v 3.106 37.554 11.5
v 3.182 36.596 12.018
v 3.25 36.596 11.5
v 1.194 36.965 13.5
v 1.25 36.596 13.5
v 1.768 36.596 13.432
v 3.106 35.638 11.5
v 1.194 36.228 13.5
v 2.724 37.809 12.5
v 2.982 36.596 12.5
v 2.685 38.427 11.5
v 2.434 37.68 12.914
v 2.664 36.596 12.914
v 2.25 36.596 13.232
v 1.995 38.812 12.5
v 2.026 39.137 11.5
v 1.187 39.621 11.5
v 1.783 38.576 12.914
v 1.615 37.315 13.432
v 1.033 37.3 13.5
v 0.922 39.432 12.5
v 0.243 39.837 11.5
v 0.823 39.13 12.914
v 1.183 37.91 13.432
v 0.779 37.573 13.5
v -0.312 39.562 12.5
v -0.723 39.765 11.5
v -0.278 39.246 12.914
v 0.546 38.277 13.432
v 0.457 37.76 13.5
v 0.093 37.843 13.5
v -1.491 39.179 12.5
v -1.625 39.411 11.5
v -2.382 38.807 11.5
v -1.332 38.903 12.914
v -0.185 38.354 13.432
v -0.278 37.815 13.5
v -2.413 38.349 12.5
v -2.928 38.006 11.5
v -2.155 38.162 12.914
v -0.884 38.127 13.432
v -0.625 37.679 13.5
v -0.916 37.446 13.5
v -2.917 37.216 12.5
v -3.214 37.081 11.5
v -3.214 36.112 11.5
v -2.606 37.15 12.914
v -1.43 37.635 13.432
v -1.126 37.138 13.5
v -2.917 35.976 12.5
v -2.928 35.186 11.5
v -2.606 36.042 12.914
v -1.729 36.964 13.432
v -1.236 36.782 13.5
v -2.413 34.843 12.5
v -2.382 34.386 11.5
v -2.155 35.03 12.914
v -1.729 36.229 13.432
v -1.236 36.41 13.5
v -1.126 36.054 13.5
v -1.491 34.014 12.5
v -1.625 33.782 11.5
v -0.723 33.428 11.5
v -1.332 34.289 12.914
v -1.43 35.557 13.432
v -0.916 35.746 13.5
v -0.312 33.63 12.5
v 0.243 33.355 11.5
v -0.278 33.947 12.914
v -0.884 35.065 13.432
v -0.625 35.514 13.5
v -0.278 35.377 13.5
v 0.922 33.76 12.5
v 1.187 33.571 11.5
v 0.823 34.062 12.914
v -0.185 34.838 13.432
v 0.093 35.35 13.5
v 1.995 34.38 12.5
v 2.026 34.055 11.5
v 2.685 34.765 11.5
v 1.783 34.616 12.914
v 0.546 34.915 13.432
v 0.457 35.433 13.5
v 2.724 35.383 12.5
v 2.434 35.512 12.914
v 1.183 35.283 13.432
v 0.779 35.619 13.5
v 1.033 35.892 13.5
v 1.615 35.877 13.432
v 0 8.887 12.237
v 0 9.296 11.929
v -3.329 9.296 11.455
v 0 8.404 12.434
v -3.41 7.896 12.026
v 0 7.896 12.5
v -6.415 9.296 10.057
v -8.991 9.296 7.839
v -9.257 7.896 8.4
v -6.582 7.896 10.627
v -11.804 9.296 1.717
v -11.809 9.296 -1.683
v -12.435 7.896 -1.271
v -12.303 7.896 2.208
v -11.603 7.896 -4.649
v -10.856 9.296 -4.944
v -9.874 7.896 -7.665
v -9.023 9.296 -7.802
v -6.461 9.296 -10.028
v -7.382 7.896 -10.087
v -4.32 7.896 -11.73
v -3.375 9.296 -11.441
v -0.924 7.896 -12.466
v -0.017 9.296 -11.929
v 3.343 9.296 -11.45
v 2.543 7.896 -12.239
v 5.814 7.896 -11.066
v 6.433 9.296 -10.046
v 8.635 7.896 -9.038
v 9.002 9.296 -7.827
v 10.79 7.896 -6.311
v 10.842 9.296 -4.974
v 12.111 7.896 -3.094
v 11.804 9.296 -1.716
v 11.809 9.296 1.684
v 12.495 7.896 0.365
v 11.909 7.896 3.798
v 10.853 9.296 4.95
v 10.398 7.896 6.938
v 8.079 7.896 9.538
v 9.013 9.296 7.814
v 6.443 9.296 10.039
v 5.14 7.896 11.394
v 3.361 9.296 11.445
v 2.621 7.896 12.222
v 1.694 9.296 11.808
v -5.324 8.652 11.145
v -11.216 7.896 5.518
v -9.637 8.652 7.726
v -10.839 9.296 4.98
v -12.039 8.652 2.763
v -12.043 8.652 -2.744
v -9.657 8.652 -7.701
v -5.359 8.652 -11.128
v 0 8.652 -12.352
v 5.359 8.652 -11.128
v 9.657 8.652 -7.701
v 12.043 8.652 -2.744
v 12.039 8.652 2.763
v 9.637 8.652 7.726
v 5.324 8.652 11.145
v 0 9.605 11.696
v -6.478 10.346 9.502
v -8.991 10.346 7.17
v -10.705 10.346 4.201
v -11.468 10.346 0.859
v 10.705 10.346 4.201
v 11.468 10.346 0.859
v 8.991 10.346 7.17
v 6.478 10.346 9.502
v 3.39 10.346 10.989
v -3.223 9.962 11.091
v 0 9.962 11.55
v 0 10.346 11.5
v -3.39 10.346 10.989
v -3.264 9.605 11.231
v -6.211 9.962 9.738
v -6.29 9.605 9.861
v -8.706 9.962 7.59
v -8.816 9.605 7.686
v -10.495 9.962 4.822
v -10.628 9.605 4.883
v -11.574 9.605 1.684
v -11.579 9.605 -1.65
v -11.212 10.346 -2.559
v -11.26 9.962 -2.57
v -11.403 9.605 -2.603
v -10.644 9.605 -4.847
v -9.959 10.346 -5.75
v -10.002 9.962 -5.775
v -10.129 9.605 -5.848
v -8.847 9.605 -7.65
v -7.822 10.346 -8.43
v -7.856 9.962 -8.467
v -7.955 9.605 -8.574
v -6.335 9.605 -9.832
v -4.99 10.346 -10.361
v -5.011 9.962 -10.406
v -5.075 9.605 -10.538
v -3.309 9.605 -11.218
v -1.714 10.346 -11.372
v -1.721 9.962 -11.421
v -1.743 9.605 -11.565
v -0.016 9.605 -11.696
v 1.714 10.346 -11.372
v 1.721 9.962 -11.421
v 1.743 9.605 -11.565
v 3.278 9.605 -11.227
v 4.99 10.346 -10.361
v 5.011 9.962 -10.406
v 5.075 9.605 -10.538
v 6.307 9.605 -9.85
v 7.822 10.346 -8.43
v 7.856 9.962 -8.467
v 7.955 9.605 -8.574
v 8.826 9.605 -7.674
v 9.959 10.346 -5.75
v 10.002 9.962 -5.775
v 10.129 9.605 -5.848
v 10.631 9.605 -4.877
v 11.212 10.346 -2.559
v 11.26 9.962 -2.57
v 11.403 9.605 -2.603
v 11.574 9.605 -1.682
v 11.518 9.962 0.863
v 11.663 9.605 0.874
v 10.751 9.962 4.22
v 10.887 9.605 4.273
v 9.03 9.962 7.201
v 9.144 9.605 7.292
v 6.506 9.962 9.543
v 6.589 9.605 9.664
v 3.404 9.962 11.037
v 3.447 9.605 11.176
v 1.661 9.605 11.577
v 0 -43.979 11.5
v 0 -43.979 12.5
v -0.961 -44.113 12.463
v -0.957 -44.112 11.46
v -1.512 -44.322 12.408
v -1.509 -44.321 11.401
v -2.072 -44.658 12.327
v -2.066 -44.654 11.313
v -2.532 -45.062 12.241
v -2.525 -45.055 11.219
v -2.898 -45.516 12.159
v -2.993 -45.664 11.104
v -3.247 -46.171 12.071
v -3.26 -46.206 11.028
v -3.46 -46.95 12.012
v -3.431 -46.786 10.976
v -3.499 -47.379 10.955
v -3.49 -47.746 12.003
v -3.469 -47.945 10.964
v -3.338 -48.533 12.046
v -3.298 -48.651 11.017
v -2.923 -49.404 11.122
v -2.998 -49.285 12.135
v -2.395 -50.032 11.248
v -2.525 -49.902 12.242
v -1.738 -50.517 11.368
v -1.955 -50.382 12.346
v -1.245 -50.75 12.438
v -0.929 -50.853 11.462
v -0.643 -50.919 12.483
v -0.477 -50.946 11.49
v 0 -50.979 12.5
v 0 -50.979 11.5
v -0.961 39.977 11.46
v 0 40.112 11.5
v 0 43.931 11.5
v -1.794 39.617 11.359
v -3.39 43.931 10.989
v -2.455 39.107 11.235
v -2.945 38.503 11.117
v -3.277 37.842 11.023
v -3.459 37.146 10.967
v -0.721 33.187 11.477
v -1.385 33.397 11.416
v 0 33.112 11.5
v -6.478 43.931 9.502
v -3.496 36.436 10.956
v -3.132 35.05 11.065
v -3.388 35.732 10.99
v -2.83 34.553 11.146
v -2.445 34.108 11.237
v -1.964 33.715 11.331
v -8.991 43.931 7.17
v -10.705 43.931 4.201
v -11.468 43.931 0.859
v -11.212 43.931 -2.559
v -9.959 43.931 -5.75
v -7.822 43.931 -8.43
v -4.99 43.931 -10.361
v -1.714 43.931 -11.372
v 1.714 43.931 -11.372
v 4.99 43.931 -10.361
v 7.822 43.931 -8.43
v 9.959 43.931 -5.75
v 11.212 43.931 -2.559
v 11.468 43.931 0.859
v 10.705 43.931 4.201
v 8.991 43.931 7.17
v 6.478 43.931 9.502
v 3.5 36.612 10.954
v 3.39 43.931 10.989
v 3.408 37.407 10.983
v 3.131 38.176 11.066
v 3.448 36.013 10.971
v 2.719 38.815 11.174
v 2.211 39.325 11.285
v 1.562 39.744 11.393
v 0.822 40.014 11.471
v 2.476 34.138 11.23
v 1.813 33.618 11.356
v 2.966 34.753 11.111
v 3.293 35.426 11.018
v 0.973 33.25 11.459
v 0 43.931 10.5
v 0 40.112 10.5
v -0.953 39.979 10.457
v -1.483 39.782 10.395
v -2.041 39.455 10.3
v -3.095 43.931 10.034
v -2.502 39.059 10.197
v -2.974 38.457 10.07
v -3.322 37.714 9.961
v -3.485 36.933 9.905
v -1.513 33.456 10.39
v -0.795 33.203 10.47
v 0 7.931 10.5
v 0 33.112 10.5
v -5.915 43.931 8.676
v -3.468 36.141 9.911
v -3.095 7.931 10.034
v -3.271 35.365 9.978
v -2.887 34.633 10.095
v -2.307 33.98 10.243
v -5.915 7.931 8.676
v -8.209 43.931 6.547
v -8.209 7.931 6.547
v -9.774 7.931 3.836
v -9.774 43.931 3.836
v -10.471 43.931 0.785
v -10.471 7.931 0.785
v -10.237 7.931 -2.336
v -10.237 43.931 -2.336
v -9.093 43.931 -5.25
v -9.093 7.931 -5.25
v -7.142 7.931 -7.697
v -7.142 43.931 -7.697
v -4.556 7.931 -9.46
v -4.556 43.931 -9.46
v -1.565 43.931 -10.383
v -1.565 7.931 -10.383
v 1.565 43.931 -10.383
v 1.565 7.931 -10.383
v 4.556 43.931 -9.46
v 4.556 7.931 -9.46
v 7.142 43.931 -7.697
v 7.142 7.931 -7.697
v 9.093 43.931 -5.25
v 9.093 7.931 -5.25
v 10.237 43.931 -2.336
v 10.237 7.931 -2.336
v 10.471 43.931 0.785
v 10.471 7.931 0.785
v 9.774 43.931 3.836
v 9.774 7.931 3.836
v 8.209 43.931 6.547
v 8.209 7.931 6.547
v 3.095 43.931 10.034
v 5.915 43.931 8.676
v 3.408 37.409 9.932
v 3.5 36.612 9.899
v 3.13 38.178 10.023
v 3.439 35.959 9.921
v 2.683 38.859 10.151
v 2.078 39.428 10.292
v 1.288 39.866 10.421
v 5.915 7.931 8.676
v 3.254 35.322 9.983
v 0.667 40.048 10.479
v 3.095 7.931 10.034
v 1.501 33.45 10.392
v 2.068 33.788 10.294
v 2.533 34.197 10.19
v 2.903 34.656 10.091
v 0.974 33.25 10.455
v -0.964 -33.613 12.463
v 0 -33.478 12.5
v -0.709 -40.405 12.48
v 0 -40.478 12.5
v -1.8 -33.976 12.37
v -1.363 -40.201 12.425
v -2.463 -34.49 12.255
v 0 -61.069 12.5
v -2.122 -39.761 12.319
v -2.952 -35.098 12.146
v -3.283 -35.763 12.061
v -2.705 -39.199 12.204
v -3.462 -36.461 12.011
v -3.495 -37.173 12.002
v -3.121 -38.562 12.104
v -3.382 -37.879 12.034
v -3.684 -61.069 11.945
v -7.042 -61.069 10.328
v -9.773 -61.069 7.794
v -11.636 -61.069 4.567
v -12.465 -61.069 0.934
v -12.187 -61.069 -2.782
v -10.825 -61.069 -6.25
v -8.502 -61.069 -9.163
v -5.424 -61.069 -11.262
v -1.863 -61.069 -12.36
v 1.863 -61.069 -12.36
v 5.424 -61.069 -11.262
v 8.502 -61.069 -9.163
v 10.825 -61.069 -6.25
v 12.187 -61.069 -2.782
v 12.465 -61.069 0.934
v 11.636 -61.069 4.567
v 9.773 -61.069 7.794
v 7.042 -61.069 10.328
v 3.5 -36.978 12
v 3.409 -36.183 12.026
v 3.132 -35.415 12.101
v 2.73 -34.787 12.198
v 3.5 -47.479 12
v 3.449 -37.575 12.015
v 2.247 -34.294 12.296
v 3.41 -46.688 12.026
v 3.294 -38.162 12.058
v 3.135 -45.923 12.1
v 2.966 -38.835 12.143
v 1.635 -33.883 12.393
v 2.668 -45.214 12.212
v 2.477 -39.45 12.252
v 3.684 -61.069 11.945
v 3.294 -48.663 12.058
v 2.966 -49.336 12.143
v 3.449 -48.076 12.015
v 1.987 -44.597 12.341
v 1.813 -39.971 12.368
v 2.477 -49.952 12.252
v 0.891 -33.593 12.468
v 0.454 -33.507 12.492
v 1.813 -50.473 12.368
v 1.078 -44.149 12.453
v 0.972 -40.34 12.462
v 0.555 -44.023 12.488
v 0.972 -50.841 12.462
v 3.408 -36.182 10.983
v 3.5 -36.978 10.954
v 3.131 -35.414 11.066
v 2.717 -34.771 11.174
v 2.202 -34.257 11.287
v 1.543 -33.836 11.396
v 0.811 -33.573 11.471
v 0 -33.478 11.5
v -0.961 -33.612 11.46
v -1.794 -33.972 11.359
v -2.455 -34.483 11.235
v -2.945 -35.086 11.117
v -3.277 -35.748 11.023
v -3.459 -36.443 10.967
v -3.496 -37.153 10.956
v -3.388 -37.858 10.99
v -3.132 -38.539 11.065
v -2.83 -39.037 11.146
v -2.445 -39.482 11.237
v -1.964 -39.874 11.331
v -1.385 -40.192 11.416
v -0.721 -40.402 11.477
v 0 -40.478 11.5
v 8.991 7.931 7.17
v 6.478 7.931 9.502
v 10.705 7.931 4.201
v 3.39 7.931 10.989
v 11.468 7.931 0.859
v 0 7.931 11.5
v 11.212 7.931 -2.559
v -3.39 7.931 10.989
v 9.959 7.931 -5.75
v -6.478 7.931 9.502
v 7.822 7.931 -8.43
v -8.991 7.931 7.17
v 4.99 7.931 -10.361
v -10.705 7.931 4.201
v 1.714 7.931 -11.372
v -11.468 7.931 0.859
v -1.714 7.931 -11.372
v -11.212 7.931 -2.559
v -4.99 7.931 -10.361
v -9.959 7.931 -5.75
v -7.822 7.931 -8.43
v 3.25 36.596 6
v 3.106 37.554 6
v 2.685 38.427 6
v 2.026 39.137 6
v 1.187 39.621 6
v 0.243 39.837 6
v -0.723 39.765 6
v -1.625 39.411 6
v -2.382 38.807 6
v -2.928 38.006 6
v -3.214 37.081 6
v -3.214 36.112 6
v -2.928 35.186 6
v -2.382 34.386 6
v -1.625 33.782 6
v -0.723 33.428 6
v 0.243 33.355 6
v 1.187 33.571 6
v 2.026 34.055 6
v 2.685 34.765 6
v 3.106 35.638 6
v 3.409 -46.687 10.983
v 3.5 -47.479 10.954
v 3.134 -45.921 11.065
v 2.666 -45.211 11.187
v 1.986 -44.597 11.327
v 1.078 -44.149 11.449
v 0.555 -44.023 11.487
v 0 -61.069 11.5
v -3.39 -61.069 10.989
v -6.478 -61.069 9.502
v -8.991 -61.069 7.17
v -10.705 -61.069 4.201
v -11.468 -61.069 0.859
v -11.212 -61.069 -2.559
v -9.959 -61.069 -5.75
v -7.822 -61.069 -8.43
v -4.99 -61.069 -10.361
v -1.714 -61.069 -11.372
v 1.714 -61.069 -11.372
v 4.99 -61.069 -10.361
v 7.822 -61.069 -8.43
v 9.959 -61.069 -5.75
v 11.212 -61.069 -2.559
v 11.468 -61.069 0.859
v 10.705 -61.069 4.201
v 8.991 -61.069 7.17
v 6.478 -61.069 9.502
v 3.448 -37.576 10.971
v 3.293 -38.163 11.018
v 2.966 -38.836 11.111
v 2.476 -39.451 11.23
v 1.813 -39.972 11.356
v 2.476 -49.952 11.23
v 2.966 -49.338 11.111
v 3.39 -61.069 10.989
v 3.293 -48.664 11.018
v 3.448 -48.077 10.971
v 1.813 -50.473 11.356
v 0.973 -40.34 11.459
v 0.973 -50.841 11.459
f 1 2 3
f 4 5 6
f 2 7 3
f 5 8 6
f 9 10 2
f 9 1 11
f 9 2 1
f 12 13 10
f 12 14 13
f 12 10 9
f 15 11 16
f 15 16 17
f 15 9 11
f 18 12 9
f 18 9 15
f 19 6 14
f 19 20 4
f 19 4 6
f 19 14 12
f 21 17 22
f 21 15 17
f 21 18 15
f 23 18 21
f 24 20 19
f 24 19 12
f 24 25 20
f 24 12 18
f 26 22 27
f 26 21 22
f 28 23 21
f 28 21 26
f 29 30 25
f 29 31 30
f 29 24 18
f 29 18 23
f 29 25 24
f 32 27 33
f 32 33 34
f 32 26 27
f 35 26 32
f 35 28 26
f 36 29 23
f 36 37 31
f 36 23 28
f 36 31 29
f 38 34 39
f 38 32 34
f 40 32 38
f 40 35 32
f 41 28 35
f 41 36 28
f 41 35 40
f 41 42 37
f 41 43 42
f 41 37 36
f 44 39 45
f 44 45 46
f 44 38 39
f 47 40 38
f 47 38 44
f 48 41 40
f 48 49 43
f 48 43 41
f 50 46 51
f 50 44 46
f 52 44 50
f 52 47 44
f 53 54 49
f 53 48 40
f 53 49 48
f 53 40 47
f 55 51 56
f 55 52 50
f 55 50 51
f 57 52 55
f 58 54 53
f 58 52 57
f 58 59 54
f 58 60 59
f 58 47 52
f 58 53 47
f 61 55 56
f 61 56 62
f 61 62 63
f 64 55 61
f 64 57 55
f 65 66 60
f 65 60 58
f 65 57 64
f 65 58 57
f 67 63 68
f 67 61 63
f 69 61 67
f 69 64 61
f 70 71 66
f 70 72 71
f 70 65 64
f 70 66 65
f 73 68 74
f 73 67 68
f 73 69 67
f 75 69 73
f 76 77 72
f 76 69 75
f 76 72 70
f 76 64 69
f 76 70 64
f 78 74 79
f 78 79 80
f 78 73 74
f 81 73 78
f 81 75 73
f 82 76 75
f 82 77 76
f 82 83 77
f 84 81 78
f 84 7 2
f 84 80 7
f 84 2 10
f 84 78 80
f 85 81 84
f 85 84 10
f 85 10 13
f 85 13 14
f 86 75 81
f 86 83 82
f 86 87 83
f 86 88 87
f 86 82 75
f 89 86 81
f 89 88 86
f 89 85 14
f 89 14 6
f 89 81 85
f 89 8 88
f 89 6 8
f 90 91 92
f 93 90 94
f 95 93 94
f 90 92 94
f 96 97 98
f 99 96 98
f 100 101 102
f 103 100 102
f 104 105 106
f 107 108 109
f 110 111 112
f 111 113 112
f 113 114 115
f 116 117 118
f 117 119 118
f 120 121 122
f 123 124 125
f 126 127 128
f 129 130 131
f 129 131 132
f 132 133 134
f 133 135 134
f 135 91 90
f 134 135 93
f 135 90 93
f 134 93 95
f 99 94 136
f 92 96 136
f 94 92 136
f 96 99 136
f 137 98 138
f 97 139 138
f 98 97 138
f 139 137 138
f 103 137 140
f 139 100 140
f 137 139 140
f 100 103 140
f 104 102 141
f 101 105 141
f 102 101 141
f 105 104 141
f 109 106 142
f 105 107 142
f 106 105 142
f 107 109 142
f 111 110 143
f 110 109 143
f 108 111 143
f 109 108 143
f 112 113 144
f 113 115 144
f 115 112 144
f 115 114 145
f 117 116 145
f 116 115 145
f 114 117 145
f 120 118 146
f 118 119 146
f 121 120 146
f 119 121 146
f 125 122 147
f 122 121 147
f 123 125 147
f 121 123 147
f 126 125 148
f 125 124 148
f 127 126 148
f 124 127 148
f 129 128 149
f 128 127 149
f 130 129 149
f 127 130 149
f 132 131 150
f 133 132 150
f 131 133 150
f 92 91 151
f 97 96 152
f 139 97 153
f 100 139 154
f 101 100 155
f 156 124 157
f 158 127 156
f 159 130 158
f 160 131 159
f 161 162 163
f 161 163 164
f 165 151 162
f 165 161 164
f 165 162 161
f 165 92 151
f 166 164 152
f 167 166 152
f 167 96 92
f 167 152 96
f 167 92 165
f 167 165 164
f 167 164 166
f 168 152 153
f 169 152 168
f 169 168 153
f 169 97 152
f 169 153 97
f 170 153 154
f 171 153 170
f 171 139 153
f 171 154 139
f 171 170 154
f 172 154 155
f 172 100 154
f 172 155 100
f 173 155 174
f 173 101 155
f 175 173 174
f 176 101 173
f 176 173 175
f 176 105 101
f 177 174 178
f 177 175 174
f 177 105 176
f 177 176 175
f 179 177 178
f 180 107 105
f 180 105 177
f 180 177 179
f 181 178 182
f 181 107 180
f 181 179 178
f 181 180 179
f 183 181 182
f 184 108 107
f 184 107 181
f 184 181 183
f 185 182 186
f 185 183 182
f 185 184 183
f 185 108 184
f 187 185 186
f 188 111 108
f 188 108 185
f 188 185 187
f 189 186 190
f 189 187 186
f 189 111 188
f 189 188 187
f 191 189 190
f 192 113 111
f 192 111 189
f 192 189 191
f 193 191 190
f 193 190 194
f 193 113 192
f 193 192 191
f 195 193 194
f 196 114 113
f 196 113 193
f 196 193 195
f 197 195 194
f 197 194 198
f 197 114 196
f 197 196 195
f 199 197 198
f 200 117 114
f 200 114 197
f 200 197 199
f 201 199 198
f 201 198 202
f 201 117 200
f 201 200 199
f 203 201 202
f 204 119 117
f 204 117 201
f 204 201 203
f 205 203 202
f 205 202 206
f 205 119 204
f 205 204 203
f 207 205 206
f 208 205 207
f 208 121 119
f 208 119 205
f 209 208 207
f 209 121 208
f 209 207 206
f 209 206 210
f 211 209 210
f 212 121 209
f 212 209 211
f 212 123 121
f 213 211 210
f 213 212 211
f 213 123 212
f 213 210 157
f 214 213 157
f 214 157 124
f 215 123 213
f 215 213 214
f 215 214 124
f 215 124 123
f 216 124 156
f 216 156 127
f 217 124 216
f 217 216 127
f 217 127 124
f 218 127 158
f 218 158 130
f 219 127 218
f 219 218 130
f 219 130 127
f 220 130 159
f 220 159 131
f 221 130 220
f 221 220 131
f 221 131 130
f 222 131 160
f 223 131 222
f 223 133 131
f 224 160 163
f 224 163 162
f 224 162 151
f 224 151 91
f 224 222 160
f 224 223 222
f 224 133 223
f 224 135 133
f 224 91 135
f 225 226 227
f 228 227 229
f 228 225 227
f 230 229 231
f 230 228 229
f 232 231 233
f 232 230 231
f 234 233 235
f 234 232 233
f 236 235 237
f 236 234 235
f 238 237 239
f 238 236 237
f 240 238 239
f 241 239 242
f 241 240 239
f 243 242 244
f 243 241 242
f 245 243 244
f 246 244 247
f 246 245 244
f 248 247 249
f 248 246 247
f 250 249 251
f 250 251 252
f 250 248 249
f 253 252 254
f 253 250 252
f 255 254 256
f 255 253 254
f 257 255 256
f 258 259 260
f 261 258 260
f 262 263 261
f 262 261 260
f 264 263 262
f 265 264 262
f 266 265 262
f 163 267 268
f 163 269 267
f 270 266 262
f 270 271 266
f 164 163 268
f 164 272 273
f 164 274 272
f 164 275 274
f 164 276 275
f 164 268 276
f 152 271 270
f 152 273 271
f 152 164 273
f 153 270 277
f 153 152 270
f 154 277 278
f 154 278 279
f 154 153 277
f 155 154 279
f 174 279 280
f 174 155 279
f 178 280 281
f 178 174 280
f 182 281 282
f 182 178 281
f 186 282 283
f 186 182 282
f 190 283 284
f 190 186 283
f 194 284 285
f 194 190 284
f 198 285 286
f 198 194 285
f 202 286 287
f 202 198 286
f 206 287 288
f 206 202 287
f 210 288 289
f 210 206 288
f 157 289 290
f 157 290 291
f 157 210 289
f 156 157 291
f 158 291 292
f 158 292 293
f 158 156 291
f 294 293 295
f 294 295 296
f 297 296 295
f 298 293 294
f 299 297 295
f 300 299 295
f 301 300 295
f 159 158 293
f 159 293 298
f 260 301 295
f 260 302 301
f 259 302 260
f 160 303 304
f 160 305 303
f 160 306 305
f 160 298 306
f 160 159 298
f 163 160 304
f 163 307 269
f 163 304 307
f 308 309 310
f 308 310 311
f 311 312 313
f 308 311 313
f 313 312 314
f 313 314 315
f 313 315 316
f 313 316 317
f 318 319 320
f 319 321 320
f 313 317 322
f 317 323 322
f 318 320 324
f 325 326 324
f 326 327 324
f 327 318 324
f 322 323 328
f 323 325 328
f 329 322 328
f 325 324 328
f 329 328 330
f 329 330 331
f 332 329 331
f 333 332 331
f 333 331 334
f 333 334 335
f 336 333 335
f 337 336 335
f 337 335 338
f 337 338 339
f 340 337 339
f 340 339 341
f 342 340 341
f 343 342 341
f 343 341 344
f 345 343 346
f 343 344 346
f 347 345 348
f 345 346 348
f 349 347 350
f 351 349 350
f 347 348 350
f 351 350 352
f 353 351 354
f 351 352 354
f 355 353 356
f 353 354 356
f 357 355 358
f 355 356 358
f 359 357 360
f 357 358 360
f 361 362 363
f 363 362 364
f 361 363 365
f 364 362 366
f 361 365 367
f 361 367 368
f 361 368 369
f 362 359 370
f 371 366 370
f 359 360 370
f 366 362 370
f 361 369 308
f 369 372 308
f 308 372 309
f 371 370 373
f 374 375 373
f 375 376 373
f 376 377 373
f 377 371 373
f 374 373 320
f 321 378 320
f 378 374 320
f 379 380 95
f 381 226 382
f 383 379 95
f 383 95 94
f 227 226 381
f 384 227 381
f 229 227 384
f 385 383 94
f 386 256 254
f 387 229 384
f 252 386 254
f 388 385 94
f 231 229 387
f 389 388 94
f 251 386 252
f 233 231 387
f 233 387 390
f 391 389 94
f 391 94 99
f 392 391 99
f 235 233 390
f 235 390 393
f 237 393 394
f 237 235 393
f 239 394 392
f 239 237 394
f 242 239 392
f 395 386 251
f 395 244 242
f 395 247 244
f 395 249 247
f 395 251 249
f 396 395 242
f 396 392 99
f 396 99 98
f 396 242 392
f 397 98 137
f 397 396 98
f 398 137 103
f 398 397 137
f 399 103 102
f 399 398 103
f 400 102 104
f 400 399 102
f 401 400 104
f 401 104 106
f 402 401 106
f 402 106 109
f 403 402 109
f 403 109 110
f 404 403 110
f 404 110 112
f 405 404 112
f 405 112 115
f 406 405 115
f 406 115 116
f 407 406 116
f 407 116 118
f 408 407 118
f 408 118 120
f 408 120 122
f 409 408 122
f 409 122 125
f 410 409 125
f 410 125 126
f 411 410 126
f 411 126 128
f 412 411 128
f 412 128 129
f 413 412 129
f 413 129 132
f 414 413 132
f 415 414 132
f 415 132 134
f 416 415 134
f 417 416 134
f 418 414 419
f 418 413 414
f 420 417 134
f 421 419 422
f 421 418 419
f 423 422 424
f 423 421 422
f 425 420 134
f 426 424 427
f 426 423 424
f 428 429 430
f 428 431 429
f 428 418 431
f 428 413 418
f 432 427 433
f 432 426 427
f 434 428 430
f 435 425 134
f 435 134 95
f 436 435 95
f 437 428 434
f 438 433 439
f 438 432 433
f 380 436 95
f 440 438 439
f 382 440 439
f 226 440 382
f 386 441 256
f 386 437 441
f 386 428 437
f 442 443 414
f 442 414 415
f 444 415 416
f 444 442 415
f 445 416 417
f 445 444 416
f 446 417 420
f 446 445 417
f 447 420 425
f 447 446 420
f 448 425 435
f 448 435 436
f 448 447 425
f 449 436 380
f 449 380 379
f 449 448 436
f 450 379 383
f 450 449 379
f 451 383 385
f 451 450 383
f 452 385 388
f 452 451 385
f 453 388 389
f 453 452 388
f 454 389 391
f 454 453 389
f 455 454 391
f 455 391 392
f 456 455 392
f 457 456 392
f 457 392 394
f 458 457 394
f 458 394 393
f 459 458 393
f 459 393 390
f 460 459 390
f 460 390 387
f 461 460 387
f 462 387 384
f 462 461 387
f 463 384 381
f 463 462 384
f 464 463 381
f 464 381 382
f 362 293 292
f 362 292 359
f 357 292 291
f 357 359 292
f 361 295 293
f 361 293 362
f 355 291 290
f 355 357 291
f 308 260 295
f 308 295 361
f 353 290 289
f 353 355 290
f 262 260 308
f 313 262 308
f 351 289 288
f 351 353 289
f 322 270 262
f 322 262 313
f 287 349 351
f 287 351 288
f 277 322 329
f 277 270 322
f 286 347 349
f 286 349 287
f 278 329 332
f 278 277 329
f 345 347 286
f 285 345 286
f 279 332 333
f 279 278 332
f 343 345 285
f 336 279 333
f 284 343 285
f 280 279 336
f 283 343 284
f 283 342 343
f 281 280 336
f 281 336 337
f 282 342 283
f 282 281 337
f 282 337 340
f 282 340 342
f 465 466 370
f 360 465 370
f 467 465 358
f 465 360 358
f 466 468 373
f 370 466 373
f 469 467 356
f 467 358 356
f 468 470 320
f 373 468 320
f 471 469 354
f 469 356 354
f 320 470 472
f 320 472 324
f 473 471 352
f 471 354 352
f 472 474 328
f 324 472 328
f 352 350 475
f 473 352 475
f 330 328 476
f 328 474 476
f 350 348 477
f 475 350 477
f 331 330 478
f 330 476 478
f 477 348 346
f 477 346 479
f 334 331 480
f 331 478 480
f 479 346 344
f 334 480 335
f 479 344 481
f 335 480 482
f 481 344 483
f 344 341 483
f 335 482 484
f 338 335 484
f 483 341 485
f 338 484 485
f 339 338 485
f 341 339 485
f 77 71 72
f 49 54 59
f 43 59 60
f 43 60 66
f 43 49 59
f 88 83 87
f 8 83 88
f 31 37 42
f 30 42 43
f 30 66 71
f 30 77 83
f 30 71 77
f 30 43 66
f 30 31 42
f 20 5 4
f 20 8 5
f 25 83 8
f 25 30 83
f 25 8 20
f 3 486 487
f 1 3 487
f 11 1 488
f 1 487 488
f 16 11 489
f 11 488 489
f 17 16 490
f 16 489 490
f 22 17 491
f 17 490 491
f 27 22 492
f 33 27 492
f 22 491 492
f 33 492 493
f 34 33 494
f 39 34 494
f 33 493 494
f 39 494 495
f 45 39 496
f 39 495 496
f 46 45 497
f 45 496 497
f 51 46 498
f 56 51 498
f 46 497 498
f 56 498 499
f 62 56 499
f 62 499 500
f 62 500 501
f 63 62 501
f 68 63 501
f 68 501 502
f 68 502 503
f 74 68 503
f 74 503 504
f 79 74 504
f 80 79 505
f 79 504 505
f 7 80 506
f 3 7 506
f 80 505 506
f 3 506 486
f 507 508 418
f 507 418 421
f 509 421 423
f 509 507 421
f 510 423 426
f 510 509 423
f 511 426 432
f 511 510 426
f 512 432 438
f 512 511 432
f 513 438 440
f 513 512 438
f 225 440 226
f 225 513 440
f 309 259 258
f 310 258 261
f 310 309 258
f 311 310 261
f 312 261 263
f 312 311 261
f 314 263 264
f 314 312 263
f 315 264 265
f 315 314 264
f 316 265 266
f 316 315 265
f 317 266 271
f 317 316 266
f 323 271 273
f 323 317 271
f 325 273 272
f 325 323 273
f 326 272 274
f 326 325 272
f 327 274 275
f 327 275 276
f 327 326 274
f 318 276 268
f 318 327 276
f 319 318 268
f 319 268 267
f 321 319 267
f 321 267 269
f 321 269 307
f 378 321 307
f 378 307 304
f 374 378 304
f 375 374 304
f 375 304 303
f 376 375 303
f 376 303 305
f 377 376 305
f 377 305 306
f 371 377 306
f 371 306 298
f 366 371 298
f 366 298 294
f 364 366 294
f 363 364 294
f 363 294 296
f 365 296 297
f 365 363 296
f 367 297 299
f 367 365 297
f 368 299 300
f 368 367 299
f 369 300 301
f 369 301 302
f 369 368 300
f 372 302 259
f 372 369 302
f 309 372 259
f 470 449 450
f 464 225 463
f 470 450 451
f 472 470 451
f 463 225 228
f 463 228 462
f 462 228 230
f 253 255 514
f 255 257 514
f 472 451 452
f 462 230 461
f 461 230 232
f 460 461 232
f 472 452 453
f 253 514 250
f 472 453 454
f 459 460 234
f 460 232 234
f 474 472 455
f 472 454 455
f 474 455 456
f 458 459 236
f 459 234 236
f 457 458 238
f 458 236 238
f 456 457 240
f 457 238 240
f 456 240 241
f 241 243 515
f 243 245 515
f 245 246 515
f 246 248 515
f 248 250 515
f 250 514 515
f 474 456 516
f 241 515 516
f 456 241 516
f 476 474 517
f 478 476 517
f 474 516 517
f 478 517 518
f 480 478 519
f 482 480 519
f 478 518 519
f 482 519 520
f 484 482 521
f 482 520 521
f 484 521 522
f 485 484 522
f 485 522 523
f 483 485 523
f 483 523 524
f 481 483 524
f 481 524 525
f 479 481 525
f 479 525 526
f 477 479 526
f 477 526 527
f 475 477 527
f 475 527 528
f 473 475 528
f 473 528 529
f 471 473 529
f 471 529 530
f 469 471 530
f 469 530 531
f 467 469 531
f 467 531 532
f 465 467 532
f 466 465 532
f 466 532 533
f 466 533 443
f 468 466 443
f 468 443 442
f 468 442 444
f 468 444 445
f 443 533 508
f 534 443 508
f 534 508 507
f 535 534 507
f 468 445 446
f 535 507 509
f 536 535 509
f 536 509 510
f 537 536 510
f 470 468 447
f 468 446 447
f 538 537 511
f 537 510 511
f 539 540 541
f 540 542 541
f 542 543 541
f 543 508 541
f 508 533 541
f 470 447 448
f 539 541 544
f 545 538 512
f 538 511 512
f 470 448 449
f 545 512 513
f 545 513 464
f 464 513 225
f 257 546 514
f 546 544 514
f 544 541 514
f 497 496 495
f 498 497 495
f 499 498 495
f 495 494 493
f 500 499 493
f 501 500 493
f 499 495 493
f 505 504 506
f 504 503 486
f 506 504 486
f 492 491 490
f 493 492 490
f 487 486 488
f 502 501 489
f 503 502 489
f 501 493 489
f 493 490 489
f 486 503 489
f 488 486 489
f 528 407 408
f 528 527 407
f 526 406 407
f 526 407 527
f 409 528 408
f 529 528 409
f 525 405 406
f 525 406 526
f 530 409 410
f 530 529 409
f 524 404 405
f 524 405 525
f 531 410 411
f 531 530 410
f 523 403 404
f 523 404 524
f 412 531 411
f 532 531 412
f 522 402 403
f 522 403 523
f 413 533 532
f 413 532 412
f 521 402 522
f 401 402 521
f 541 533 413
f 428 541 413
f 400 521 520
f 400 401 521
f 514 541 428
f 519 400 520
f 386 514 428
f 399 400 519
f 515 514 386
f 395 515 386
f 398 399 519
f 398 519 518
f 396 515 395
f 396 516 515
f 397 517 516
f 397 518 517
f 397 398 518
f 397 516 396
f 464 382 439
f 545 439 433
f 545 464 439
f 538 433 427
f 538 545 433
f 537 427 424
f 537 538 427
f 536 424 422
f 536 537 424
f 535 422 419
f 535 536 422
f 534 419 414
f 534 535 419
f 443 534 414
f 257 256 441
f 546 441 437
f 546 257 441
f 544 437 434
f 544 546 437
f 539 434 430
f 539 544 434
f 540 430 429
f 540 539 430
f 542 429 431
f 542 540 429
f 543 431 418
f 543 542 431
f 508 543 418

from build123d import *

# Parameters (mm, degrees)
F2_T     = -1
F4_R     = 2
F6_DEPTH = 15
F8_R     = 3.25
F9_DEPTH = 7.5
F10_R    = 2


# Not quite as in the source:
# - a fillet or chamfer that OpenCascade refuses, or shapes differently, is made with other operations: its cross-section is extruded or revolved along the edge and cut away or added
# - a feature names something its author has since deleted; it is built from what else it names


with BuildPart() as f1:
    # F0 (on Right) → F1 (revolve)
    with BuildSketch(Plane.YZ):
        Polygon((-61.0685050488, 12.5), (-61.0685050488, 0), (43.9314949512, 0), (43.9314949512, 11.5), (8.9314949512, 11.5), (8.9314949512, 12.5), align=None)
    revolve(axis=Axis((0, -8.5685050488, 0), (0, -1, 0)))

    # F2
    f2_openings = [f1.faces().sort_by_distance(p)[0] for p in [
        (0, -61.068505, 0),
        (0, 43.931495, 0),
    ]]
    offset(amount=F2_T, openings=f2_openings, kind=Kind.INTERSECTION)

    # F3: fillet of radius 1.5 on 1 edges, made by hand

    # F3_s1 → F3_t2 (revolve)
    with BuildSketch(Plane.YZ):
        with BuildLine():
            ThreePointArc((10.3457085136, 11.5), (9.4796831098, 11.7752551286), (8.9314949512, 12.5))
            Line((8.9314949512, 12.5), (8.9314949512, 11.5))
            Line((8.9314949512, 11.5), (10.3457085136, 11.5))
        make_face()
    revolve(axis=Axis((0, 8.9314949512, 0), (0, -1, 0)))

    # F4
    f4_edges = [f1.edges().sort_by_distance(p)[0] for p in [
        (0, 8.931495, -12.5),
    ]]
    fillet(f4_edges, radius=F4_R)

    # F5 (on Top) → F6 (cut)
    with BuildSketch(Plane.XY):
        with BuildLine():
            ThreePointArc((3.5, -36.9775111079), (-2.4748737342, -34.5026373738), (0, -40.4775111079))
            ThreePointArc((0, -40.4775111079), (2.4748737342, -39.4523848421), (3.5, -36.9775111079))
        make_face()
        with BuildLine():
            ThreePointArc((3.25, -36.9775111079), (2.2980970389, -39.2756081468), (0, -40.2275111079))
            ThreePointArc((0, -40.2275111079), (-2.2980970389, -34.6794140691), (3.25, -36.9775111079))
        make_face(mode=Mode.SUBTRACT)
        with BuildLine():
            ThreePointArc((3.5, 36.6118407249), (2.4748737342, 39.0867144591), (0, 40.1118407249))
            ThreePointArc((0, 40.1118407249), (-2.4748737342, 34.1369669908), (3.5, 36.6118407249))
        make_face()
        with BuildLine():
            ThreePointArc((3.25, 36.6118407249), (-2.2980970389, 34.3137436861), (0, 39.8618407249))
            ThreePointArc((0, 39.8618407249), (2.2980970389, 38.9099377638), (3.25, 36.6118407249))
        make_face(mode=Mode.SUBTRACT)
        with BuildLine():
            ThreePointArc((3.25, 36.6118407249), (2.2980970389, 38.9099377638), (0, 39.8618407249))
            ThreePointArc((0, 39.8618407249), (-2.2980970389, 34.3137436861), (3.25, 36.6118407249))
        make_face()
        with BuildLine():
            ThreePointArc((3.25, -36.9775111079), (-2.2980970389, -34.6794140691), (0, -40.2275111079))
            ThreePointArc((0, -40.2275111079), (2.2980970389, -39.2756081468), (3.25, -36.9775111079))
        make_face()
        with BuildLine():
            Line((0, -43.9788174033), (0, -50.9788174033))
            ThreePointArc((0, -50.9788174033), (2.4748737342, -49.9536911375), (3.5, -47.4788174033))
            ThreePointArc((3.5, -47.4788174033), (2.4748737342, -45.0039436692), (0, -43.9788174033))
        make_face()
        with BuildLine():
            ThreePointArc((0, -43.9788174033), (-3.5, -47.4788174033), (0, -50.9788174033))
            Line((0, -50.9788174033), (0, -43.9788174033))
        make_face()
    extrude(amount=F6_DEPTH, mode=Mode.SUBTRACT)


with BuildPart() as f9:
    # F8 (on offset) → F9 (new body)
    with BuildSketch(Plane.XY.offset(6)):
        with Locations((0, 36.5961231291)):
            Circle(F8_R)
    extrude(amount=F9_DEPTH)

    # F10
    f10_edges = [f9.edges().sort_by_distance(p)[0] for p in [
        (-3.25, 36.596123, 13.5),
    ]]
    fillet(f10_edges, radius=F10_R)


solid = Compound([f1.part, f9.part])
